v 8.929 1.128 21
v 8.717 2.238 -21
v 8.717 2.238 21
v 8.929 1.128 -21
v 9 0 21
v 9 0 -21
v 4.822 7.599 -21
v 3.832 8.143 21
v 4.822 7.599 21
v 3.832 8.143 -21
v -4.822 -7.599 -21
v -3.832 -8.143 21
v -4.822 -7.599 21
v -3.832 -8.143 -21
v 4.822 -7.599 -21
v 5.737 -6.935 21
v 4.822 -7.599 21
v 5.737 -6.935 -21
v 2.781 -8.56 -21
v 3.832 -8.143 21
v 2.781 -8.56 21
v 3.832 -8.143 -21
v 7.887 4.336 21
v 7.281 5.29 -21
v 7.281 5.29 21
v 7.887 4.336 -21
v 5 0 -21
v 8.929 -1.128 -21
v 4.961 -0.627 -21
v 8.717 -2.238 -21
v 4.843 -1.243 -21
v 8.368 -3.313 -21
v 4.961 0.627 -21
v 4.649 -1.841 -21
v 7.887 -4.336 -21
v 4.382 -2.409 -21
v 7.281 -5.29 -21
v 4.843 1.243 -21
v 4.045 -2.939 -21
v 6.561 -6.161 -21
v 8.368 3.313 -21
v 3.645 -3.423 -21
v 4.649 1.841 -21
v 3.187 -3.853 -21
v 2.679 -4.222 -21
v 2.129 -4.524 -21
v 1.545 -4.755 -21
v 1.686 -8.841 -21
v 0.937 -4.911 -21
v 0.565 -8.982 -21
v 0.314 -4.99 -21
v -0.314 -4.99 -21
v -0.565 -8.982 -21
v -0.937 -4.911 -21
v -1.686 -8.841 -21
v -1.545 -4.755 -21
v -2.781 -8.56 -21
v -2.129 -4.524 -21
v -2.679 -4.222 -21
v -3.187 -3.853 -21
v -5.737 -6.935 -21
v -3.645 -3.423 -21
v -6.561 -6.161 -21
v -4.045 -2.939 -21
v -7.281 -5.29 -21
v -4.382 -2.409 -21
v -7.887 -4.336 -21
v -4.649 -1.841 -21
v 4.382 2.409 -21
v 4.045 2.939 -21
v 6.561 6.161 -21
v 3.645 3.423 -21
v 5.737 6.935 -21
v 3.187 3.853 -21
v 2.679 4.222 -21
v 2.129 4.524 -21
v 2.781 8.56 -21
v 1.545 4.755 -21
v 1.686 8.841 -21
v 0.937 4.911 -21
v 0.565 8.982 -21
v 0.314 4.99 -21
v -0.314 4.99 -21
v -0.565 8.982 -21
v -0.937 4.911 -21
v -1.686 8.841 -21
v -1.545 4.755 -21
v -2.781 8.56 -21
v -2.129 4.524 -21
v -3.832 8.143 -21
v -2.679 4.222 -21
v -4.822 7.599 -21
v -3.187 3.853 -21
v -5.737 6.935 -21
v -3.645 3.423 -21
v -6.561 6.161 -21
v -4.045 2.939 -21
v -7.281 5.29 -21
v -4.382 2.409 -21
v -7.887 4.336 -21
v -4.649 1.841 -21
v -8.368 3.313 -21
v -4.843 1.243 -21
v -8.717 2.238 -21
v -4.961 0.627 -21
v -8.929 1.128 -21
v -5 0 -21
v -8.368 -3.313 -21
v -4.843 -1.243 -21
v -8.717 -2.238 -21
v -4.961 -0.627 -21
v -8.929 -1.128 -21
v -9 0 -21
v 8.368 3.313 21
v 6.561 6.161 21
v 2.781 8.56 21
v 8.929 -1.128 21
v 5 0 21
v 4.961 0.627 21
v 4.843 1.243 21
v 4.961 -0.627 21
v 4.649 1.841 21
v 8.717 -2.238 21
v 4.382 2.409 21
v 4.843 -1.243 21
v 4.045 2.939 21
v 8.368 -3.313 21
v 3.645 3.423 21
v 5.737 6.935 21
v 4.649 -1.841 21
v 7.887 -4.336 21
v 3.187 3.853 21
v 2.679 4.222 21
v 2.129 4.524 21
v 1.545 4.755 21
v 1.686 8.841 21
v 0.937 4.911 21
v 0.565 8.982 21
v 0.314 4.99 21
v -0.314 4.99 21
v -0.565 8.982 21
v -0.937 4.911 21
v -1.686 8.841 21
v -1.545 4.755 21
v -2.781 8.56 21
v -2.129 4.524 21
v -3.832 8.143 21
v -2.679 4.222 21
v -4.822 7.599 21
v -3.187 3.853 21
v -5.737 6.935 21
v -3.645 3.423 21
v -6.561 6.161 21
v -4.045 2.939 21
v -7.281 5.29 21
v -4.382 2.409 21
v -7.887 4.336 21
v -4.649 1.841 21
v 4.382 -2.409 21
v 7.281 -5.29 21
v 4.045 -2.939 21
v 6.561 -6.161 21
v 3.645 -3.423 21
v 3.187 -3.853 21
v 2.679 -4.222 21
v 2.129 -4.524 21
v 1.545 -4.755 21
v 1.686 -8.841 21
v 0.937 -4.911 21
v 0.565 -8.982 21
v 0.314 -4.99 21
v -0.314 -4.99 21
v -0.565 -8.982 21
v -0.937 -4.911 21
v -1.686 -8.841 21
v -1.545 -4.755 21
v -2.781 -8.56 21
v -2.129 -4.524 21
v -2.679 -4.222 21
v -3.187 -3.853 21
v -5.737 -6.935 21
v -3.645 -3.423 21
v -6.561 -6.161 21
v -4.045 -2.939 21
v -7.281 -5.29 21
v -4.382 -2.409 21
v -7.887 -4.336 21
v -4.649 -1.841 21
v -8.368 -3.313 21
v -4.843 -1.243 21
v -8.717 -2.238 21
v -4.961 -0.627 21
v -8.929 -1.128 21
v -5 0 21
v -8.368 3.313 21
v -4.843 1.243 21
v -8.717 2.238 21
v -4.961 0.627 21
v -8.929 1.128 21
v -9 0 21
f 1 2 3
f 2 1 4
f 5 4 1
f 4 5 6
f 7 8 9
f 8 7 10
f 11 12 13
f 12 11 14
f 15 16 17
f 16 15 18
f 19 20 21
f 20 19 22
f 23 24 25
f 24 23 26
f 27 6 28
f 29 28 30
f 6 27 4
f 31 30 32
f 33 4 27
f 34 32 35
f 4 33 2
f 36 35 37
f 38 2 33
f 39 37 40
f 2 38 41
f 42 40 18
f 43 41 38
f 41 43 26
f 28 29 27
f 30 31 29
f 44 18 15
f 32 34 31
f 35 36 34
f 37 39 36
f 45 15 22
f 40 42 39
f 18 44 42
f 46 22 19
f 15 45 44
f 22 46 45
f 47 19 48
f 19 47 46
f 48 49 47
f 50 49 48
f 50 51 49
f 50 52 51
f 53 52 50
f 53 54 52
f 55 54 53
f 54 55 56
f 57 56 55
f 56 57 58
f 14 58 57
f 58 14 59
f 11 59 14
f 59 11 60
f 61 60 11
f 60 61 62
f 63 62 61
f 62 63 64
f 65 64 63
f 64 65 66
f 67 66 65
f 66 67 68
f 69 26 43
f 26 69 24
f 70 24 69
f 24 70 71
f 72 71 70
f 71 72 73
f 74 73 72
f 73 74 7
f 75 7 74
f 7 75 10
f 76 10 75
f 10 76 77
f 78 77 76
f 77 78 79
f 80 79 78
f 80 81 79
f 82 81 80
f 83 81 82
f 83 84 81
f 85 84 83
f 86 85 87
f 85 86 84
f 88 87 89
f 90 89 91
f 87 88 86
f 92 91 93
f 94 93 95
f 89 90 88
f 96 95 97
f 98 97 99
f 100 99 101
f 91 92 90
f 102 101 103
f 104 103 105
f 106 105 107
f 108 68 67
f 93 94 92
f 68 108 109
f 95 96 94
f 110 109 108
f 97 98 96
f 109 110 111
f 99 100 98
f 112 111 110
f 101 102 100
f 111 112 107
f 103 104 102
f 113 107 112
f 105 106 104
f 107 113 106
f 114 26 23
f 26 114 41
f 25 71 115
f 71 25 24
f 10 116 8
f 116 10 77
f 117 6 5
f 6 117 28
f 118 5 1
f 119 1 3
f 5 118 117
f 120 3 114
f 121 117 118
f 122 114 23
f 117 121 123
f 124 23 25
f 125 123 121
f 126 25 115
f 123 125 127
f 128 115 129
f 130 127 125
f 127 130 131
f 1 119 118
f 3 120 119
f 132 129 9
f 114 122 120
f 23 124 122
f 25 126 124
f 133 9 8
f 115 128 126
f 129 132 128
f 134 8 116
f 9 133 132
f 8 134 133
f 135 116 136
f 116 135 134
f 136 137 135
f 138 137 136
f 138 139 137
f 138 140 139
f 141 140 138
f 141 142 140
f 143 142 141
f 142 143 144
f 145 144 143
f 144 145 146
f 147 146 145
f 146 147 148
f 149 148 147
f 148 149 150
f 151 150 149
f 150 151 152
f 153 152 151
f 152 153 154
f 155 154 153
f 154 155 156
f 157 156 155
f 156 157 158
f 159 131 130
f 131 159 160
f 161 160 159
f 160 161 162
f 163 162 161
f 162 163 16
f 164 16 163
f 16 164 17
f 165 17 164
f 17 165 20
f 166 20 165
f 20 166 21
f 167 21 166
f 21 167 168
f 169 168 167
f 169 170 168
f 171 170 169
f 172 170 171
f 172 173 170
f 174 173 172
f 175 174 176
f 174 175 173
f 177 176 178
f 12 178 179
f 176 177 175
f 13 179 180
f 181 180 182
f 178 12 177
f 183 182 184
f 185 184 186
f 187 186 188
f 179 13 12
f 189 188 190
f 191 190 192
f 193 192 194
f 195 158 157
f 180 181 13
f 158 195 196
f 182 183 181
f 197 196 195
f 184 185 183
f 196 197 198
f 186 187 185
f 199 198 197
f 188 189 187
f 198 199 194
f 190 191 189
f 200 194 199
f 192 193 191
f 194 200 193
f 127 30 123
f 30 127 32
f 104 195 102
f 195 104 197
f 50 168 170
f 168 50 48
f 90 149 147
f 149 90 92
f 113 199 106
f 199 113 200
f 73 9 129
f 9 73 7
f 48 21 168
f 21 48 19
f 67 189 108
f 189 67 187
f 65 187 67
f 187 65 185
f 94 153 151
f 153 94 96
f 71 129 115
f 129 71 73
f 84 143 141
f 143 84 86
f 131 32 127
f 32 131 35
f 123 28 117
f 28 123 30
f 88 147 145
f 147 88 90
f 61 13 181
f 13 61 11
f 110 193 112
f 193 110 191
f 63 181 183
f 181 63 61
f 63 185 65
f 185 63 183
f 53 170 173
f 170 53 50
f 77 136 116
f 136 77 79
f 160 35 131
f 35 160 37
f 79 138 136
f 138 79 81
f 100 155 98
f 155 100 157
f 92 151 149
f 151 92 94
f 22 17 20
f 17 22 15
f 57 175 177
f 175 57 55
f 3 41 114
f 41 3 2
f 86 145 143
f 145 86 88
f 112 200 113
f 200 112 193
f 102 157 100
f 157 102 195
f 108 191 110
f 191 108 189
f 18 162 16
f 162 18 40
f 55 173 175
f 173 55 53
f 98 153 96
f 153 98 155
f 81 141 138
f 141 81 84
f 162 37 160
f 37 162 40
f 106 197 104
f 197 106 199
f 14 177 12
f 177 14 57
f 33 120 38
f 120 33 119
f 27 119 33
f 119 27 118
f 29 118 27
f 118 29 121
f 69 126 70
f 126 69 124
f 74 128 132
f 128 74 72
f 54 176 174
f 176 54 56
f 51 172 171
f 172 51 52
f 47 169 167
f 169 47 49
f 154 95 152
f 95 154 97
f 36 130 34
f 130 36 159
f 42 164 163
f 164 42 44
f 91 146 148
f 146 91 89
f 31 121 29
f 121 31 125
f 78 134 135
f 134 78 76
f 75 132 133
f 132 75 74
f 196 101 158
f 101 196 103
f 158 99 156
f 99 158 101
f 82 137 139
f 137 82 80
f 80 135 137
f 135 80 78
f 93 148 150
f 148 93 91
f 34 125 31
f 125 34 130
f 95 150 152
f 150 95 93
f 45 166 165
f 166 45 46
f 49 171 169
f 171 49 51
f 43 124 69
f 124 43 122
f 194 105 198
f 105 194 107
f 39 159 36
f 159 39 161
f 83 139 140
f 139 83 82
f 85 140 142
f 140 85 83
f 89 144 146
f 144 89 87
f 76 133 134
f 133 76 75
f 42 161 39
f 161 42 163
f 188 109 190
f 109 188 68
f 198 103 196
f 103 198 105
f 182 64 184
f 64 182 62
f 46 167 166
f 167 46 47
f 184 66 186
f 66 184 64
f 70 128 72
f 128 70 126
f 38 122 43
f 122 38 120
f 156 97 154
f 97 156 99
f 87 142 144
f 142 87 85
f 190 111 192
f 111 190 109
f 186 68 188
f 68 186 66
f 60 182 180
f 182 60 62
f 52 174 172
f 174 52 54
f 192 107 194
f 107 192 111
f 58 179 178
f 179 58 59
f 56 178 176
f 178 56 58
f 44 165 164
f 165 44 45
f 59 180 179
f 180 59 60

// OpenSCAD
$fn = 50;


difference() {
	union() {
		translate(v = [0, 0, -21.0000000000]) {
			cylinder(h = 42, r = 9.0000000000);
		}
	}
	union() {
		translate(v = [0, 0, -100.0000000000]) {
			cylinder(h = 200, r = 5.0000000000);
		}
	}
}
